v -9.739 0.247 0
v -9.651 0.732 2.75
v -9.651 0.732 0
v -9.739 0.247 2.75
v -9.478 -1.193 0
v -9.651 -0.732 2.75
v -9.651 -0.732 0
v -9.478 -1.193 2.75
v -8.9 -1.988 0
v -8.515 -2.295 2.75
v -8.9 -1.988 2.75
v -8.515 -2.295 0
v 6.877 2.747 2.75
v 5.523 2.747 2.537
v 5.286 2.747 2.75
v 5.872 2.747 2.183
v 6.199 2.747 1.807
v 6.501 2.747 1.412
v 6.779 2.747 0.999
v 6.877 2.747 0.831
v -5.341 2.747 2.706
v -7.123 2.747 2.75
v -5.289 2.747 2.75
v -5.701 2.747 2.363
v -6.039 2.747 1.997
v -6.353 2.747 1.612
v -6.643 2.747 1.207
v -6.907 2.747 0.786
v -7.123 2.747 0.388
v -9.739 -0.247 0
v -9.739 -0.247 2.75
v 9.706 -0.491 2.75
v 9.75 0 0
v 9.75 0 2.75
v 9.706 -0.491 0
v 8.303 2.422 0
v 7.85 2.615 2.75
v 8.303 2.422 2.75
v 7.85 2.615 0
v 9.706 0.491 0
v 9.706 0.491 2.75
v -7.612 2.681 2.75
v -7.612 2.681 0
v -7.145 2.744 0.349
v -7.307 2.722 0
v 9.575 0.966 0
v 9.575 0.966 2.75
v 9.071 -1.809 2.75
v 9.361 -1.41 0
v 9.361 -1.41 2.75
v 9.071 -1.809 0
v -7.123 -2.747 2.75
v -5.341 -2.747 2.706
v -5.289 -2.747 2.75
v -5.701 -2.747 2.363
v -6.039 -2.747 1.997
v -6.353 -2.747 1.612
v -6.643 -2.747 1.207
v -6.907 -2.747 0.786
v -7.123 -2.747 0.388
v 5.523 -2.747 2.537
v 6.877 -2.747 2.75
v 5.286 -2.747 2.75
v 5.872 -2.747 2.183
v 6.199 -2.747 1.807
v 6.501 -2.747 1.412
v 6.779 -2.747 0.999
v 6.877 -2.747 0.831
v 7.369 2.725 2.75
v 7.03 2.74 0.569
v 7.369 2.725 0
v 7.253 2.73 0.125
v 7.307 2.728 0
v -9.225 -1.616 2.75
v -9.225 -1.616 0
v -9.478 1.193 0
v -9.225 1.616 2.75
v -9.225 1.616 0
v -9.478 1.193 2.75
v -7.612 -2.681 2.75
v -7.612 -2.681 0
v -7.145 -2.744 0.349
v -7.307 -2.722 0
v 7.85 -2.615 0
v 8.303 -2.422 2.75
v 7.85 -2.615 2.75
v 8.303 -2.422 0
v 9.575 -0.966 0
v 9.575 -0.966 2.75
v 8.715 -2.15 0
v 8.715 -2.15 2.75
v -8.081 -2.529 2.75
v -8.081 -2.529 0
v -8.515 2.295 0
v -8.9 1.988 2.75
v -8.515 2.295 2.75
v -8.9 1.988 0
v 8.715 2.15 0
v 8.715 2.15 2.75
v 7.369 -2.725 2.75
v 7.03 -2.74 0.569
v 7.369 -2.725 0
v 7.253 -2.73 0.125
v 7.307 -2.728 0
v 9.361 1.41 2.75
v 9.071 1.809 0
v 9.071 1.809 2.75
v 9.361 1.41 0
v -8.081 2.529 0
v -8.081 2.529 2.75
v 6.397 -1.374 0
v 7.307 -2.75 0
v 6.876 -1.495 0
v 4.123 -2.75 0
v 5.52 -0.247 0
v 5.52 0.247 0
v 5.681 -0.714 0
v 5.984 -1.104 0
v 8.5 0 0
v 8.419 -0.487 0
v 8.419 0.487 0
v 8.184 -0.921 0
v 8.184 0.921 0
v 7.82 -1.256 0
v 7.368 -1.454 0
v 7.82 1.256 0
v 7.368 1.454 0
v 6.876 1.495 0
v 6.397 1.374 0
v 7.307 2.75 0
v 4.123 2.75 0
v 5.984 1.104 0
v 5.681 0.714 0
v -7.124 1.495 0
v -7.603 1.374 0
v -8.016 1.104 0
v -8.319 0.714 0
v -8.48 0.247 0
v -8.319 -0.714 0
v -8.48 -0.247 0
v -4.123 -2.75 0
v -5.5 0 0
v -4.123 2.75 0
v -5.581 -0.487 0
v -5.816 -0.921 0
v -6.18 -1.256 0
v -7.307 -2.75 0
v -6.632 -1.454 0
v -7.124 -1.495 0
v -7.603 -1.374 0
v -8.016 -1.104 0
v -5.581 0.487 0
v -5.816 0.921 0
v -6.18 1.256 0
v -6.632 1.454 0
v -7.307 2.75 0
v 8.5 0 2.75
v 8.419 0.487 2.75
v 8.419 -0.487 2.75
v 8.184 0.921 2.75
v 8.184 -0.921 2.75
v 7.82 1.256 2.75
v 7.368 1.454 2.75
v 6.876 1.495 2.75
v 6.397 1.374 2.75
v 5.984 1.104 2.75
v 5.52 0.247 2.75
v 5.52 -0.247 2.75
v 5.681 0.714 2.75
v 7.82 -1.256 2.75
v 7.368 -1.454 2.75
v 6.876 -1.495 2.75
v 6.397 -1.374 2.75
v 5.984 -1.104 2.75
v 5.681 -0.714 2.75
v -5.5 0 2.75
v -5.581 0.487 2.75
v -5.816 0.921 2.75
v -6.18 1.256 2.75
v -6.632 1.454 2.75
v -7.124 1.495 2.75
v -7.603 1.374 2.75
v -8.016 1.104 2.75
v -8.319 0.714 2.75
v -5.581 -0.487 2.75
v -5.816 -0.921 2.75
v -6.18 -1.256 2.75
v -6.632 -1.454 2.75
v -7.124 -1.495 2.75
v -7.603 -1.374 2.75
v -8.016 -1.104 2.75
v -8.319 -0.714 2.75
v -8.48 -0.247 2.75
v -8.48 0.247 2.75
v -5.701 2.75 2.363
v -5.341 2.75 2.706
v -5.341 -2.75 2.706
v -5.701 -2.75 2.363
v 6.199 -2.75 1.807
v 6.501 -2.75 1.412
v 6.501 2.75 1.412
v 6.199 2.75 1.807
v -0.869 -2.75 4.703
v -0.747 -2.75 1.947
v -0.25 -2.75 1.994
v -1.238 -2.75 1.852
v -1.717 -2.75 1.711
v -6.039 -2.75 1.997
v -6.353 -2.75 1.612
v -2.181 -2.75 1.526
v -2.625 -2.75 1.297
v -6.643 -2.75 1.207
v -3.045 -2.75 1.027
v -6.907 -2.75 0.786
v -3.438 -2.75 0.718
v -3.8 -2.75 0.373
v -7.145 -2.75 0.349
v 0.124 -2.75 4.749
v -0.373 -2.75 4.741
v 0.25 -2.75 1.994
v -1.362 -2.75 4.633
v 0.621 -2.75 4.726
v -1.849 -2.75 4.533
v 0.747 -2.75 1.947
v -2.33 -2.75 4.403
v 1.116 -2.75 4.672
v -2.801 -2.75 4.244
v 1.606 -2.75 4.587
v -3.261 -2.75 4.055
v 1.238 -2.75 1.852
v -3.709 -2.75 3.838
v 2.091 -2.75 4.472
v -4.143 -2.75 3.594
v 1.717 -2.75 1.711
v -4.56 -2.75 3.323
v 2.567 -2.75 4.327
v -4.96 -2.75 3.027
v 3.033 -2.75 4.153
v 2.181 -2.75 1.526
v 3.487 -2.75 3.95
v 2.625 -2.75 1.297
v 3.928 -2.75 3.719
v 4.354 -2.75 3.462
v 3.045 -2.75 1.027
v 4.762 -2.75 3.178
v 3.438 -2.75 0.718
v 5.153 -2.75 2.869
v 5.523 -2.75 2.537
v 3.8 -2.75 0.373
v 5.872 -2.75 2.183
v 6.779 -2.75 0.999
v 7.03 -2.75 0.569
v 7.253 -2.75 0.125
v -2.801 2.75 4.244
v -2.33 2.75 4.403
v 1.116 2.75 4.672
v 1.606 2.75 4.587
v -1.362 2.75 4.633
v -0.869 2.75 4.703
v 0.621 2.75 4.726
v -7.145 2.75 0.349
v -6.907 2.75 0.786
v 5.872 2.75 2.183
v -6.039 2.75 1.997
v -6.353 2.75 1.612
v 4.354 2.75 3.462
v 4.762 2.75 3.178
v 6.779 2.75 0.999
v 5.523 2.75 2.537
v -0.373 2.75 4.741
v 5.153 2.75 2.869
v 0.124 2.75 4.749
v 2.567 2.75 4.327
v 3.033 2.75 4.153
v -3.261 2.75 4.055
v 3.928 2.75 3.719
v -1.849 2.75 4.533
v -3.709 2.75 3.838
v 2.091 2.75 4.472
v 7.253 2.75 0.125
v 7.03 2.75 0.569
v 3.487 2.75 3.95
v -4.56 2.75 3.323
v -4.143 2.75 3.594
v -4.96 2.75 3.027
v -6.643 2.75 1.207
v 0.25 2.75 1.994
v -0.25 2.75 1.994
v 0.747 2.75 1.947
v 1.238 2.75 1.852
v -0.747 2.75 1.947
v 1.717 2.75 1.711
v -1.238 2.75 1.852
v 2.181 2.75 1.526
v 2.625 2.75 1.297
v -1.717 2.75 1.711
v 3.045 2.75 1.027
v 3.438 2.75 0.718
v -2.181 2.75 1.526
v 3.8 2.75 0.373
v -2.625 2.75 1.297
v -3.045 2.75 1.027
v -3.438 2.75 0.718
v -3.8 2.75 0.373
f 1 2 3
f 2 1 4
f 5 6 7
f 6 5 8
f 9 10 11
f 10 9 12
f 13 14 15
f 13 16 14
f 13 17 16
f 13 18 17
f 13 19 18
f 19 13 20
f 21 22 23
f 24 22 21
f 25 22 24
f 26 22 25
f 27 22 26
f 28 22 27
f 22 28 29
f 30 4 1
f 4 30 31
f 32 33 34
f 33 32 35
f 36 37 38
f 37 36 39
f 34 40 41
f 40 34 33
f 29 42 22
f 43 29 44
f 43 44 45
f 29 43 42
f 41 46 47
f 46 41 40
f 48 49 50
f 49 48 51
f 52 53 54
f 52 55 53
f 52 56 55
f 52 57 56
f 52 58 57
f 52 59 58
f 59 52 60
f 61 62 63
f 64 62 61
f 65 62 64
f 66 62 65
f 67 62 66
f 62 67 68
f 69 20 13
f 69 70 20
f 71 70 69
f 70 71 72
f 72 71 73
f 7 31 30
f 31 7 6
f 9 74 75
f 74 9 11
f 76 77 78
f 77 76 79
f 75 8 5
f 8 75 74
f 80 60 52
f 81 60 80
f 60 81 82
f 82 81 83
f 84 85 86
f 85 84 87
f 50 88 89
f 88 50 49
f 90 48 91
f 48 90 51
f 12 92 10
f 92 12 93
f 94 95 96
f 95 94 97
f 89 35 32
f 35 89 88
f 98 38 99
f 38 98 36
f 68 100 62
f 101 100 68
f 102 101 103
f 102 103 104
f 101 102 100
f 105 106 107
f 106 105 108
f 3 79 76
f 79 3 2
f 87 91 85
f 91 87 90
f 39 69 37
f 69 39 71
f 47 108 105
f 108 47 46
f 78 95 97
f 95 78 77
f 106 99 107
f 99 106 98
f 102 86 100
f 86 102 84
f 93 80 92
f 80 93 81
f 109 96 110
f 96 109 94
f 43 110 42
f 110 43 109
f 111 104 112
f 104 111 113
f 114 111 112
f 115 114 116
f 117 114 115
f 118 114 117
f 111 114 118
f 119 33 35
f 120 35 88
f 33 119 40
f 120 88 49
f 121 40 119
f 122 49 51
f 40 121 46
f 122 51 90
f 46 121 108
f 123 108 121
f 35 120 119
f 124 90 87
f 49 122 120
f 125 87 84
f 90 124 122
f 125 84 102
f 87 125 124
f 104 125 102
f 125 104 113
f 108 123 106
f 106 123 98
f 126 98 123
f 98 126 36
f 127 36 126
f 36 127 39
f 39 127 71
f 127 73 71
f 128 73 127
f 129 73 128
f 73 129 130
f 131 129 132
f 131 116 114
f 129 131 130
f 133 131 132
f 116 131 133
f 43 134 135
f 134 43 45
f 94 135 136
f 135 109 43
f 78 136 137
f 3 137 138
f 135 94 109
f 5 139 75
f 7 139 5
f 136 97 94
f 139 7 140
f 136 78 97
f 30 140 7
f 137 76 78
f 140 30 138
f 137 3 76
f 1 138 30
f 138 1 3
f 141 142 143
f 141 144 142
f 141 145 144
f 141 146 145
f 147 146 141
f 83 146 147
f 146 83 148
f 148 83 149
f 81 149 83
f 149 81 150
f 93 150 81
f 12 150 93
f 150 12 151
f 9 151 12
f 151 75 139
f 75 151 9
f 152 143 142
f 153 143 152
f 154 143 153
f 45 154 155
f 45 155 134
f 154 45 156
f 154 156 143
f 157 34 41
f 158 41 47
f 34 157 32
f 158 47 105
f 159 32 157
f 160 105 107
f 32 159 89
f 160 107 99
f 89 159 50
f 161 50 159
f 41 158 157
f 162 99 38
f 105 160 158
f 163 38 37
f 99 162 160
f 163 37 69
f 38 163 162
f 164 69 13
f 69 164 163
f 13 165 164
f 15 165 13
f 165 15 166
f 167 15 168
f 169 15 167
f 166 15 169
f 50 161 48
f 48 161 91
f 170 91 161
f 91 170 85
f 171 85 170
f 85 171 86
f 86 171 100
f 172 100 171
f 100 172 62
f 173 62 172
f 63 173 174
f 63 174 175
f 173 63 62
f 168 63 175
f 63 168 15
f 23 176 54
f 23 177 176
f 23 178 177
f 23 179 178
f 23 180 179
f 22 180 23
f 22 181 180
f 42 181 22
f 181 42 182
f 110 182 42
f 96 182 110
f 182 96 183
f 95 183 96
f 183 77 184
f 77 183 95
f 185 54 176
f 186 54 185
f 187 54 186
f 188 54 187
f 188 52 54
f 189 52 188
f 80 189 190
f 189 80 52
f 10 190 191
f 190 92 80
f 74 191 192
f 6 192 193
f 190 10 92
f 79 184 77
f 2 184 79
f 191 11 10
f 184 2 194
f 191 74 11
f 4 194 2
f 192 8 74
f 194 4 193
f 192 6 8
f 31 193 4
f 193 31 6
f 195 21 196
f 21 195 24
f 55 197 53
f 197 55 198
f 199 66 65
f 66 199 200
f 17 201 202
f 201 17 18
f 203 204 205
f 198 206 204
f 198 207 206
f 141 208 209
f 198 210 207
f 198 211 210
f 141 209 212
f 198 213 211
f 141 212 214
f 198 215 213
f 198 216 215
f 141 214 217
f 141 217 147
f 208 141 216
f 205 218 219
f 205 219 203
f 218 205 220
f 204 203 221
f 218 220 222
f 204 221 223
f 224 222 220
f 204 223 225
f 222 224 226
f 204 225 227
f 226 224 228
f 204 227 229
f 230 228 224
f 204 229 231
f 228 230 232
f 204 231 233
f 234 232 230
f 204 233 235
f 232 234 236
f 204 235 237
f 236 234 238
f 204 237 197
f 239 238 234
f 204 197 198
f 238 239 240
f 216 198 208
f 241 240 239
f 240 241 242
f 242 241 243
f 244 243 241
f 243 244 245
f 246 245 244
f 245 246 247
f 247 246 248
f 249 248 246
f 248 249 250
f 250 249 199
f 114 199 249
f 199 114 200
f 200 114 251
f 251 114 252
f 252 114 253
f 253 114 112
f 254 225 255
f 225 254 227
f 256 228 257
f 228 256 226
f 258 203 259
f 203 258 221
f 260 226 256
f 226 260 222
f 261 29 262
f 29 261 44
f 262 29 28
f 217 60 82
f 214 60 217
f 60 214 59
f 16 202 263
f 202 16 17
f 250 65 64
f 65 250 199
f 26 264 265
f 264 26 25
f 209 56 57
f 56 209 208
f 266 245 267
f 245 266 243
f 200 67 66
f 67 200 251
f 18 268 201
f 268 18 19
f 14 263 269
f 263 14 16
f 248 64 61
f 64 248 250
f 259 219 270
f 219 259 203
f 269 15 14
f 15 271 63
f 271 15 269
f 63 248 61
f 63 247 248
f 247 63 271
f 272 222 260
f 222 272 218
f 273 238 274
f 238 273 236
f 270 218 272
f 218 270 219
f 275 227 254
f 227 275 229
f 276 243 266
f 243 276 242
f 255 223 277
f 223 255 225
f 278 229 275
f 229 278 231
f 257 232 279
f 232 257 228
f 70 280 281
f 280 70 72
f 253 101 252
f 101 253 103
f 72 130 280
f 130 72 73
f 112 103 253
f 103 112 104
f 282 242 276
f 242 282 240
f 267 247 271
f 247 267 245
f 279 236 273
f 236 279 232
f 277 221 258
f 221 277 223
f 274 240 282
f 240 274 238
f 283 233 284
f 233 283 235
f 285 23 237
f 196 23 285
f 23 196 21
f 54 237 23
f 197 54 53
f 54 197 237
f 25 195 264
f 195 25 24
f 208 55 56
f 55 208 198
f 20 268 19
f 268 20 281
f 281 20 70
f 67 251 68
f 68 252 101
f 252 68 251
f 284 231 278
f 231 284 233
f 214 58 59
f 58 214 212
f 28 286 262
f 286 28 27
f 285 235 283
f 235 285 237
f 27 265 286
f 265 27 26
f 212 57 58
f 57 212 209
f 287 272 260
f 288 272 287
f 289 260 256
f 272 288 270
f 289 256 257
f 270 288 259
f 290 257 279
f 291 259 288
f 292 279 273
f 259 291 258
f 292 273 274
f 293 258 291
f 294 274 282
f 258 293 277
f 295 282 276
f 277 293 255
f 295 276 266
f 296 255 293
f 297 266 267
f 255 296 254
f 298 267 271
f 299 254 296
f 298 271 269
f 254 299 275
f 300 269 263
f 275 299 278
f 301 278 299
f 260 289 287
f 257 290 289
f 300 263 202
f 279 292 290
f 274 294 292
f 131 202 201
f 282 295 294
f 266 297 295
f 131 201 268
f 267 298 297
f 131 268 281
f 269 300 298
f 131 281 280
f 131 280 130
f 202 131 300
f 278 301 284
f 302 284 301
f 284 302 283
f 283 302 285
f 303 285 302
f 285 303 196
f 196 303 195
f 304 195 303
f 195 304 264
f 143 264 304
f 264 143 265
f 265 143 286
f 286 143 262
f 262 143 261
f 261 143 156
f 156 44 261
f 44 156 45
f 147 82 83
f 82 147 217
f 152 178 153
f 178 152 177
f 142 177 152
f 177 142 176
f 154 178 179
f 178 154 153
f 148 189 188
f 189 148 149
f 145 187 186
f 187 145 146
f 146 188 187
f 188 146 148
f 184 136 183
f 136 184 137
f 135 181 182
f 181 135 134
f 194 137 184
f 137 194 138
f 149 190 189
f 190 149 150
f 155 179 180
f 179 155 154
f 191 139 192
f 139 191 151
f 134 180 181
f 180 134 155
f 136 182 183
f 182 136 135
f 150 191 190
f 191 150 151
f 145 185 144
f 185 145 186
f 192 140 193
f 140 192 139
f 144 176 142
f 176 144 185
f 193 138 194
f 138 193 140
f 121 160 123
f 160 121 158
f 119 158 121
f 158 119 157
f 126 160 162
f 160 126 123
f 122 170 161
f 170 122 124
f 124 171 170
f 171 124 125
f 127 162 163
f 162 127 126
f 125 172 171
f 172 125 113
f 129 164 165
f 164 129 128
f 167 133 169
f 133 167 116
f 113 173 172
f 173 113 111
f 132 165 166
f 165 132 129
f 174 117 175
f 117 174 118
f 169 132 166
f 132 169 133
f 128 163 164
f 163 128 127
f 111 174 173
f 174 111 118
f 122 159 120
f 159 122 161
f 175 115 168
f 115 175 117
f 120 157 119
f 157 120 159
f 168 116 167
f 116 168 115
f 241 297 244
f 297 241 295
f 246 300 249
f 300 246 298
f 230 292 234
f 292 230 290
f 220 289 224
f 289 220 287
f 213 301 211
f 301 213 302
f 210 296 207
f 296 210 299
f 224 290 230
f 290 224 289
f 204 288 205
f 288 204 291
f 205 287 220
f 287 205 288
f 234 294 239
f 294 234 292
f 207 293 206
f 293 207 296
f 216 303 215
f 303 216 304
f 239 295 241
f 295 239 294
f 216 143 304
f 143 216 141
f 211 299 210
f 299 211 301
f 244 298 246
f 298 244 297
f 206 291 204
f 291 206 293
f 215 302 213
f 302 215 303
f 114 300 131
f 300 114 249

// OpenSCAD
// Wire clamp for electronics
// https://www.thingiverse.com/thing:3765512
// Vilem Marsik, 2019
// License: CC BY-NC-SA 
// https://creativecommons.org/licenses/by-nc-sa/4.0/

width=5.5;
hole2hole=14;
hole_diameter=3;
thickness=2.75;
bridge_radius=8;
bridge_height=2;

/* [Hidden] */
$fs=.5;
$fa=.5;
zb=bridge_height-bridge_radius+thickness;

difference()	{
	union()	{
		hull()
			for(i=[-1,1])
				translate([hole2hole*i/2,0,0])
					cylinder(d=width,h=thickness);
		translate([0,-width/2,zb])
			rotate([-90,0,0])
				cylinder(r=bridge_radius,h=width);
	}
	for(i=[-1,1])
		translate([hole2hole*i/2,0,-1])
			cylinder(d=hole_diameter,h=thickness+2);
	translate([0,-width/2-1,zb])
		rotate([-90,0,0])
			cylinder(r=bridge_radius-thickness,h=width+2);
	translate([-hole2hole/2-width/2-1,-width/2-1,-2*bridge_radius])
		cube([hole2hole+width+2,width+2,2*bridge_radius]);
}
